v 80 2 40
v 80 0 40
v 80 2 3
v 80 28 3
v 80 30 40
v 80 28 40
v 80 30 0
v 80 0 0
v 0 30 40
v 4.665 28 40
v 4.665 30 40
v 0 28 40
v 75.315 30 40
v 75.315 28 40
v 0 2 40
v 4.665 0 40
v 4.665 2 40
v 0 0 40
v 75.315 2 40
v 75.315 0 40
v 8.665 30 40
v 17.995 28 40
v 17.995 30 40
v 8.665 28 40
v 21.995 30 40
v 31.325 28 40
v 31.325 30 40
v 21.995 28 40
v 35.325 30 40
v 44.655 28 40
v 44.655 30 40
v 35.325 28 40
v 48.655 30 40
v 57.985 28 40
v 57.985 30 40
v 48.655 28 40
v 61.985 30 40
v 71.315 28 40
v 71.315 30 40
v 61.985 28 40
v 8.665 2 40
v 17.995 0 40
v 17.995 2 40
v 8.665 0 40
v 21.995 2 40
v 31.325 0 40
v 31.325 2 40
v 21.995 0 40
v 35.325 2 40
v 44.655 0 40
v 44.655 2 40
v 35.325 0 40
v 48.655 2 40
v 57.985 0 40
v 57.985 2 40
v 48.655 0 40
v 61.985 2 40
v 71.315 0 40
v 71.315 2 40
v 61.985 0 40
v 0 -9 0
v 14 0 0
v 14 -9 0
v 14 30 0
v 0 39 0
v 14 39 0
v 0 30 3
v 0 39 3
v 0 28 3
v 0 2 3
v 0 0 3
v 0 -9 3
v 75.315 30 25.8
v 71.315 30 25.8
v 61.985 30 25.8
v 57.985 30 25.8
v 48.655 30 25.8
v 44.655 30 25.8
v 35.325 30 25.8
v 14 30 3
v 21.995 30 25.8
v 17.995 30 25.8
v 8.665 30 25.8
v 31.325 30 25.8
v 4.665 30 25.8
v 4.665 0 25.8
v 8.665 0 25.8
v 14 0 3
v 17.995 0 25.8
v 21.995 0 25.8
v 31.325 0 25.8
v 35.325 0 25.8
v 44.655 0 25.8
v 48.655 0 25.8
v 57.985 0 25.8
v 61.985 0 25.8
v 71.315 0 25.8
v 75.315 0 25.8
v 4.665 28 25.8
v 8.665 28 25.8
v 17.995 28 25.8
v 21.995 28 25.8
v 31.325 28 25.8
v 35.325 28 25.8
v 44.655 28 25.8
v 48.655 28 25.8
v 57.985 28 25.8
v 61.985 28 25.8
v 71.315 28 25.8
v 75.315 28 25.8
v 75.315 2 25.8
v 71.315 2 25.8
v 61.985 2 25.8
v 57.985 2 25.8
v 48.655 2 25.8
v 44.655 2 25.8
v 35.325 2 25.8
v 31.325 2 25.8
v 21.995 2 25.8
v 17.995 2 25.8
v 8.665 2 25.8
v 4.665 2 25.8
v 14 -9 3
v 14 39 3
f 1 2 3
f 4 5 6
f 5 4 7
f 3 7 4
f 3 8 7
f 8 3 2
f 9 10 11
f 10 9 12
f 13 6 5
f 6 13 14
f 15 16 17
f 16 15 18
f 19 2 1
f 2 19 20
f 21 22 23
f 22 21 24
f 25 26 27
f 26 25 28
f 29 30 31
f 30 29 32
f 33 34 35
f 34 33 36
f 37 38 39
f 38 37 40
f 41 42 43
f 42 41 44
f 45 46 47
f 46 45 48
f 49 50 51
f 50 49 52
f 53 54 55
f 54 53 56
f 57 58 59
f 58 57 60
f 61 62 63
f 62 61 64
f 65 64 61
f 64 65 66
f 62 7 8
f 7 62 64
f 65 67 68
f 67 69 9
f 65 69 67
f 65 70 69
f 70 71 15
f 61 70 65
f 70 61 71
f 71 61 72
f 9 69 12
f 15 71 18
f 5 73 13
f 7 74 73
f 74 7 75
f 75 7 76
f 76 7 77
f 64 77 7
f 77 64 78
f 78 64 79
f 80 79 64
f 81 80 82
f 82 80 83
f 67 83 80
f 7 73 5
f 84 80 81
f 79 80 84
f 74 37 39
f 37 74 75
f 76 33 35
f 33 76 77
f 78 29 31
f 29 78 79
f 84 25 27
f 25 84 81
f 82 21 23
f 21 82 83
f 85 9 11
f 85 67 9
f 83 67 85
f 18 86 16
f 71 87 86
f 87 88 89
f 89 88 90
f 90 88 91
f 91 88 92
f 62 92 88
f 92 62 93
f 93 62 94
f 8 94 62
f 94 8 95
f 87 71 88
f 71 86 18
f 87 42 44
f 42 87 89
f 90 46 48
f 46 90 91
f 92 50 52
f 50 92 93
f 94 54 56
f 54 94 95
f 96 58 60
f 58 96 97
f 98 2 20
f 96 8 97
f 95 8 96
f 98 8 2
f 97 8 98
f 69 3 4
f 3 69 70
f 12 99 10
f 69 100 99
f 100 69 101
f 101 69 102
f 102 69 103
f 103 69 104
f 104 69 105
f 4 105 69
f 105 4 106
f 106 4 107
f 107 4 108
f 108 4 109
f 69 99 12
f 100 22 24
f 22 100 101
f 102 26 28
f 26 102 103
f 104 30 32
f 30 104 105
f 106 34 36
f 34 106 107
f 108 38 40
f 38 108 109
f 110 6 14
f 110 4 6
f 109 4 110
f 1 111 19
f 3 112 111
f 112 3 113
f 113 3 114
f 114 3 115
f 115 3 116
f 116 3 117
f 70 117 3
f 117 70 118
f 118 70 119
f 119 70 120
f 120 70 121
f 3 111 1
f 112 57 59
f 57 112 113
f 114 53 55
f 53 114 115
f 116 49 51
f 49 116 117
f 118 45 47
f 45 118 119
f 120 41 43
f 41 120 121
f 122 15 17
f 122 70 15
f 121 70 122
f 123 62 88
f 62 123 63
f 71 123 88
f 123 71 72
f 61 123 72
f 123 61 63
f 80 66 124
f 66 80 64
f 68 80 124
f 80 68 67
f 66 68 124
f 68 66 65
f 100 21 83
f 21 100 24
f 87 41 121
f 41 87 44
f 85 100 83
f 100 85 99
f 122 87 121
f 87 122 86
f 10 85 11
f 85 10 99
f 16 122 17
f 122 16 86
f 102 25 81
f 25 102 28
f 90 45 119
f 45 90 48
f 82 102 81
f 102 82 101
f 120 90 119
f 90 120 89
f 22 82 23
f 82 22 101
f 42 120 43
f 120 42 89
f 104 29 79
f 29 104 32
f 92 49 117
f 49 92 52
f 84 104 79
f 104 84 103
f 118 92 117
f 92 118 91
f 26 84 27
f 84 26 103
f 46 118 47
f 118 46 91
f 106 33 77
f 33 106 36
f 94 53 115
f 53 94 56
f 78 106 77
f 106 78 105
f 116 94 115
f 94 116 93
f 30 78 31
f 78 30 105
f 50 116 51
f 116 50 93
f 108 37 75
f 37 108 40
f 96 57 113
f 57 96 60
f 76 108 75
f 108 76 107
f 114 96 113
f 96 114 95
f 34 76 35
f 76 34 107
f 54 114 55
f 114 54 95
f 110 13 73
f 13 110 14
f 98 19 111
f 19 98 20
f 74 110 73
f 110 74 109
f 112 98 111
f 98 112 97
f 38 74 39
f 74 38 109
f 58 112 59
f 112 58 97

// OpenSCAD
$fn = 32;

// ----------------------------------------------------------------------
// Cable duct: 80 x 30 x 40 mm, 6 fingers
// ----------------------------------------------------------------------

// --- parameters (mm) ---
duct_len = 80;            // duct length, X
duct_w = 30;              // duct width, Y
duct_h = 40;              // duct height, Z
wall_t = 2;               // side wall thickness
floor_t = 3;              // floor thickness
slot_w = 4;               // finger slot width
slot_h = 22.8;            // finger slot height
fingers = 6;              // number of finger slots per side
pitch = 13.33;            // finger pitch
ear_w = 10;               // mounting ear width
ear_l = 14;               // mounting ear length

module shell() {
  difference() {
    cube([duct_len, duct_w, duct_h]);
    /* open top channel */
    translate([-wall_t - 1, wall_t, floor_t])
      cube([duct_len + 2 * wall_t + 2, duct_w - 2 * wall_t, duct_h + 1]);
  }
}

module ears() {
  translate([0, -ear_w + 1, 0]) cube([ear_l, ear_w, floor_t]);
  translate([0, duct_w - 1, 0]) cube([ear_l, ear_w, floor_t]);
}

difference() {
  union() {
    shell();
    ears();
  }
  /* finger slots cut through both side walls */
  for (i = [0 : fingers - 1]) translate([pitch / 2 + i * pitch - slot_w / 2, -1, floor_t + slot_h]) cube([slot_w, duct_w + 2, duct_h]);
}
